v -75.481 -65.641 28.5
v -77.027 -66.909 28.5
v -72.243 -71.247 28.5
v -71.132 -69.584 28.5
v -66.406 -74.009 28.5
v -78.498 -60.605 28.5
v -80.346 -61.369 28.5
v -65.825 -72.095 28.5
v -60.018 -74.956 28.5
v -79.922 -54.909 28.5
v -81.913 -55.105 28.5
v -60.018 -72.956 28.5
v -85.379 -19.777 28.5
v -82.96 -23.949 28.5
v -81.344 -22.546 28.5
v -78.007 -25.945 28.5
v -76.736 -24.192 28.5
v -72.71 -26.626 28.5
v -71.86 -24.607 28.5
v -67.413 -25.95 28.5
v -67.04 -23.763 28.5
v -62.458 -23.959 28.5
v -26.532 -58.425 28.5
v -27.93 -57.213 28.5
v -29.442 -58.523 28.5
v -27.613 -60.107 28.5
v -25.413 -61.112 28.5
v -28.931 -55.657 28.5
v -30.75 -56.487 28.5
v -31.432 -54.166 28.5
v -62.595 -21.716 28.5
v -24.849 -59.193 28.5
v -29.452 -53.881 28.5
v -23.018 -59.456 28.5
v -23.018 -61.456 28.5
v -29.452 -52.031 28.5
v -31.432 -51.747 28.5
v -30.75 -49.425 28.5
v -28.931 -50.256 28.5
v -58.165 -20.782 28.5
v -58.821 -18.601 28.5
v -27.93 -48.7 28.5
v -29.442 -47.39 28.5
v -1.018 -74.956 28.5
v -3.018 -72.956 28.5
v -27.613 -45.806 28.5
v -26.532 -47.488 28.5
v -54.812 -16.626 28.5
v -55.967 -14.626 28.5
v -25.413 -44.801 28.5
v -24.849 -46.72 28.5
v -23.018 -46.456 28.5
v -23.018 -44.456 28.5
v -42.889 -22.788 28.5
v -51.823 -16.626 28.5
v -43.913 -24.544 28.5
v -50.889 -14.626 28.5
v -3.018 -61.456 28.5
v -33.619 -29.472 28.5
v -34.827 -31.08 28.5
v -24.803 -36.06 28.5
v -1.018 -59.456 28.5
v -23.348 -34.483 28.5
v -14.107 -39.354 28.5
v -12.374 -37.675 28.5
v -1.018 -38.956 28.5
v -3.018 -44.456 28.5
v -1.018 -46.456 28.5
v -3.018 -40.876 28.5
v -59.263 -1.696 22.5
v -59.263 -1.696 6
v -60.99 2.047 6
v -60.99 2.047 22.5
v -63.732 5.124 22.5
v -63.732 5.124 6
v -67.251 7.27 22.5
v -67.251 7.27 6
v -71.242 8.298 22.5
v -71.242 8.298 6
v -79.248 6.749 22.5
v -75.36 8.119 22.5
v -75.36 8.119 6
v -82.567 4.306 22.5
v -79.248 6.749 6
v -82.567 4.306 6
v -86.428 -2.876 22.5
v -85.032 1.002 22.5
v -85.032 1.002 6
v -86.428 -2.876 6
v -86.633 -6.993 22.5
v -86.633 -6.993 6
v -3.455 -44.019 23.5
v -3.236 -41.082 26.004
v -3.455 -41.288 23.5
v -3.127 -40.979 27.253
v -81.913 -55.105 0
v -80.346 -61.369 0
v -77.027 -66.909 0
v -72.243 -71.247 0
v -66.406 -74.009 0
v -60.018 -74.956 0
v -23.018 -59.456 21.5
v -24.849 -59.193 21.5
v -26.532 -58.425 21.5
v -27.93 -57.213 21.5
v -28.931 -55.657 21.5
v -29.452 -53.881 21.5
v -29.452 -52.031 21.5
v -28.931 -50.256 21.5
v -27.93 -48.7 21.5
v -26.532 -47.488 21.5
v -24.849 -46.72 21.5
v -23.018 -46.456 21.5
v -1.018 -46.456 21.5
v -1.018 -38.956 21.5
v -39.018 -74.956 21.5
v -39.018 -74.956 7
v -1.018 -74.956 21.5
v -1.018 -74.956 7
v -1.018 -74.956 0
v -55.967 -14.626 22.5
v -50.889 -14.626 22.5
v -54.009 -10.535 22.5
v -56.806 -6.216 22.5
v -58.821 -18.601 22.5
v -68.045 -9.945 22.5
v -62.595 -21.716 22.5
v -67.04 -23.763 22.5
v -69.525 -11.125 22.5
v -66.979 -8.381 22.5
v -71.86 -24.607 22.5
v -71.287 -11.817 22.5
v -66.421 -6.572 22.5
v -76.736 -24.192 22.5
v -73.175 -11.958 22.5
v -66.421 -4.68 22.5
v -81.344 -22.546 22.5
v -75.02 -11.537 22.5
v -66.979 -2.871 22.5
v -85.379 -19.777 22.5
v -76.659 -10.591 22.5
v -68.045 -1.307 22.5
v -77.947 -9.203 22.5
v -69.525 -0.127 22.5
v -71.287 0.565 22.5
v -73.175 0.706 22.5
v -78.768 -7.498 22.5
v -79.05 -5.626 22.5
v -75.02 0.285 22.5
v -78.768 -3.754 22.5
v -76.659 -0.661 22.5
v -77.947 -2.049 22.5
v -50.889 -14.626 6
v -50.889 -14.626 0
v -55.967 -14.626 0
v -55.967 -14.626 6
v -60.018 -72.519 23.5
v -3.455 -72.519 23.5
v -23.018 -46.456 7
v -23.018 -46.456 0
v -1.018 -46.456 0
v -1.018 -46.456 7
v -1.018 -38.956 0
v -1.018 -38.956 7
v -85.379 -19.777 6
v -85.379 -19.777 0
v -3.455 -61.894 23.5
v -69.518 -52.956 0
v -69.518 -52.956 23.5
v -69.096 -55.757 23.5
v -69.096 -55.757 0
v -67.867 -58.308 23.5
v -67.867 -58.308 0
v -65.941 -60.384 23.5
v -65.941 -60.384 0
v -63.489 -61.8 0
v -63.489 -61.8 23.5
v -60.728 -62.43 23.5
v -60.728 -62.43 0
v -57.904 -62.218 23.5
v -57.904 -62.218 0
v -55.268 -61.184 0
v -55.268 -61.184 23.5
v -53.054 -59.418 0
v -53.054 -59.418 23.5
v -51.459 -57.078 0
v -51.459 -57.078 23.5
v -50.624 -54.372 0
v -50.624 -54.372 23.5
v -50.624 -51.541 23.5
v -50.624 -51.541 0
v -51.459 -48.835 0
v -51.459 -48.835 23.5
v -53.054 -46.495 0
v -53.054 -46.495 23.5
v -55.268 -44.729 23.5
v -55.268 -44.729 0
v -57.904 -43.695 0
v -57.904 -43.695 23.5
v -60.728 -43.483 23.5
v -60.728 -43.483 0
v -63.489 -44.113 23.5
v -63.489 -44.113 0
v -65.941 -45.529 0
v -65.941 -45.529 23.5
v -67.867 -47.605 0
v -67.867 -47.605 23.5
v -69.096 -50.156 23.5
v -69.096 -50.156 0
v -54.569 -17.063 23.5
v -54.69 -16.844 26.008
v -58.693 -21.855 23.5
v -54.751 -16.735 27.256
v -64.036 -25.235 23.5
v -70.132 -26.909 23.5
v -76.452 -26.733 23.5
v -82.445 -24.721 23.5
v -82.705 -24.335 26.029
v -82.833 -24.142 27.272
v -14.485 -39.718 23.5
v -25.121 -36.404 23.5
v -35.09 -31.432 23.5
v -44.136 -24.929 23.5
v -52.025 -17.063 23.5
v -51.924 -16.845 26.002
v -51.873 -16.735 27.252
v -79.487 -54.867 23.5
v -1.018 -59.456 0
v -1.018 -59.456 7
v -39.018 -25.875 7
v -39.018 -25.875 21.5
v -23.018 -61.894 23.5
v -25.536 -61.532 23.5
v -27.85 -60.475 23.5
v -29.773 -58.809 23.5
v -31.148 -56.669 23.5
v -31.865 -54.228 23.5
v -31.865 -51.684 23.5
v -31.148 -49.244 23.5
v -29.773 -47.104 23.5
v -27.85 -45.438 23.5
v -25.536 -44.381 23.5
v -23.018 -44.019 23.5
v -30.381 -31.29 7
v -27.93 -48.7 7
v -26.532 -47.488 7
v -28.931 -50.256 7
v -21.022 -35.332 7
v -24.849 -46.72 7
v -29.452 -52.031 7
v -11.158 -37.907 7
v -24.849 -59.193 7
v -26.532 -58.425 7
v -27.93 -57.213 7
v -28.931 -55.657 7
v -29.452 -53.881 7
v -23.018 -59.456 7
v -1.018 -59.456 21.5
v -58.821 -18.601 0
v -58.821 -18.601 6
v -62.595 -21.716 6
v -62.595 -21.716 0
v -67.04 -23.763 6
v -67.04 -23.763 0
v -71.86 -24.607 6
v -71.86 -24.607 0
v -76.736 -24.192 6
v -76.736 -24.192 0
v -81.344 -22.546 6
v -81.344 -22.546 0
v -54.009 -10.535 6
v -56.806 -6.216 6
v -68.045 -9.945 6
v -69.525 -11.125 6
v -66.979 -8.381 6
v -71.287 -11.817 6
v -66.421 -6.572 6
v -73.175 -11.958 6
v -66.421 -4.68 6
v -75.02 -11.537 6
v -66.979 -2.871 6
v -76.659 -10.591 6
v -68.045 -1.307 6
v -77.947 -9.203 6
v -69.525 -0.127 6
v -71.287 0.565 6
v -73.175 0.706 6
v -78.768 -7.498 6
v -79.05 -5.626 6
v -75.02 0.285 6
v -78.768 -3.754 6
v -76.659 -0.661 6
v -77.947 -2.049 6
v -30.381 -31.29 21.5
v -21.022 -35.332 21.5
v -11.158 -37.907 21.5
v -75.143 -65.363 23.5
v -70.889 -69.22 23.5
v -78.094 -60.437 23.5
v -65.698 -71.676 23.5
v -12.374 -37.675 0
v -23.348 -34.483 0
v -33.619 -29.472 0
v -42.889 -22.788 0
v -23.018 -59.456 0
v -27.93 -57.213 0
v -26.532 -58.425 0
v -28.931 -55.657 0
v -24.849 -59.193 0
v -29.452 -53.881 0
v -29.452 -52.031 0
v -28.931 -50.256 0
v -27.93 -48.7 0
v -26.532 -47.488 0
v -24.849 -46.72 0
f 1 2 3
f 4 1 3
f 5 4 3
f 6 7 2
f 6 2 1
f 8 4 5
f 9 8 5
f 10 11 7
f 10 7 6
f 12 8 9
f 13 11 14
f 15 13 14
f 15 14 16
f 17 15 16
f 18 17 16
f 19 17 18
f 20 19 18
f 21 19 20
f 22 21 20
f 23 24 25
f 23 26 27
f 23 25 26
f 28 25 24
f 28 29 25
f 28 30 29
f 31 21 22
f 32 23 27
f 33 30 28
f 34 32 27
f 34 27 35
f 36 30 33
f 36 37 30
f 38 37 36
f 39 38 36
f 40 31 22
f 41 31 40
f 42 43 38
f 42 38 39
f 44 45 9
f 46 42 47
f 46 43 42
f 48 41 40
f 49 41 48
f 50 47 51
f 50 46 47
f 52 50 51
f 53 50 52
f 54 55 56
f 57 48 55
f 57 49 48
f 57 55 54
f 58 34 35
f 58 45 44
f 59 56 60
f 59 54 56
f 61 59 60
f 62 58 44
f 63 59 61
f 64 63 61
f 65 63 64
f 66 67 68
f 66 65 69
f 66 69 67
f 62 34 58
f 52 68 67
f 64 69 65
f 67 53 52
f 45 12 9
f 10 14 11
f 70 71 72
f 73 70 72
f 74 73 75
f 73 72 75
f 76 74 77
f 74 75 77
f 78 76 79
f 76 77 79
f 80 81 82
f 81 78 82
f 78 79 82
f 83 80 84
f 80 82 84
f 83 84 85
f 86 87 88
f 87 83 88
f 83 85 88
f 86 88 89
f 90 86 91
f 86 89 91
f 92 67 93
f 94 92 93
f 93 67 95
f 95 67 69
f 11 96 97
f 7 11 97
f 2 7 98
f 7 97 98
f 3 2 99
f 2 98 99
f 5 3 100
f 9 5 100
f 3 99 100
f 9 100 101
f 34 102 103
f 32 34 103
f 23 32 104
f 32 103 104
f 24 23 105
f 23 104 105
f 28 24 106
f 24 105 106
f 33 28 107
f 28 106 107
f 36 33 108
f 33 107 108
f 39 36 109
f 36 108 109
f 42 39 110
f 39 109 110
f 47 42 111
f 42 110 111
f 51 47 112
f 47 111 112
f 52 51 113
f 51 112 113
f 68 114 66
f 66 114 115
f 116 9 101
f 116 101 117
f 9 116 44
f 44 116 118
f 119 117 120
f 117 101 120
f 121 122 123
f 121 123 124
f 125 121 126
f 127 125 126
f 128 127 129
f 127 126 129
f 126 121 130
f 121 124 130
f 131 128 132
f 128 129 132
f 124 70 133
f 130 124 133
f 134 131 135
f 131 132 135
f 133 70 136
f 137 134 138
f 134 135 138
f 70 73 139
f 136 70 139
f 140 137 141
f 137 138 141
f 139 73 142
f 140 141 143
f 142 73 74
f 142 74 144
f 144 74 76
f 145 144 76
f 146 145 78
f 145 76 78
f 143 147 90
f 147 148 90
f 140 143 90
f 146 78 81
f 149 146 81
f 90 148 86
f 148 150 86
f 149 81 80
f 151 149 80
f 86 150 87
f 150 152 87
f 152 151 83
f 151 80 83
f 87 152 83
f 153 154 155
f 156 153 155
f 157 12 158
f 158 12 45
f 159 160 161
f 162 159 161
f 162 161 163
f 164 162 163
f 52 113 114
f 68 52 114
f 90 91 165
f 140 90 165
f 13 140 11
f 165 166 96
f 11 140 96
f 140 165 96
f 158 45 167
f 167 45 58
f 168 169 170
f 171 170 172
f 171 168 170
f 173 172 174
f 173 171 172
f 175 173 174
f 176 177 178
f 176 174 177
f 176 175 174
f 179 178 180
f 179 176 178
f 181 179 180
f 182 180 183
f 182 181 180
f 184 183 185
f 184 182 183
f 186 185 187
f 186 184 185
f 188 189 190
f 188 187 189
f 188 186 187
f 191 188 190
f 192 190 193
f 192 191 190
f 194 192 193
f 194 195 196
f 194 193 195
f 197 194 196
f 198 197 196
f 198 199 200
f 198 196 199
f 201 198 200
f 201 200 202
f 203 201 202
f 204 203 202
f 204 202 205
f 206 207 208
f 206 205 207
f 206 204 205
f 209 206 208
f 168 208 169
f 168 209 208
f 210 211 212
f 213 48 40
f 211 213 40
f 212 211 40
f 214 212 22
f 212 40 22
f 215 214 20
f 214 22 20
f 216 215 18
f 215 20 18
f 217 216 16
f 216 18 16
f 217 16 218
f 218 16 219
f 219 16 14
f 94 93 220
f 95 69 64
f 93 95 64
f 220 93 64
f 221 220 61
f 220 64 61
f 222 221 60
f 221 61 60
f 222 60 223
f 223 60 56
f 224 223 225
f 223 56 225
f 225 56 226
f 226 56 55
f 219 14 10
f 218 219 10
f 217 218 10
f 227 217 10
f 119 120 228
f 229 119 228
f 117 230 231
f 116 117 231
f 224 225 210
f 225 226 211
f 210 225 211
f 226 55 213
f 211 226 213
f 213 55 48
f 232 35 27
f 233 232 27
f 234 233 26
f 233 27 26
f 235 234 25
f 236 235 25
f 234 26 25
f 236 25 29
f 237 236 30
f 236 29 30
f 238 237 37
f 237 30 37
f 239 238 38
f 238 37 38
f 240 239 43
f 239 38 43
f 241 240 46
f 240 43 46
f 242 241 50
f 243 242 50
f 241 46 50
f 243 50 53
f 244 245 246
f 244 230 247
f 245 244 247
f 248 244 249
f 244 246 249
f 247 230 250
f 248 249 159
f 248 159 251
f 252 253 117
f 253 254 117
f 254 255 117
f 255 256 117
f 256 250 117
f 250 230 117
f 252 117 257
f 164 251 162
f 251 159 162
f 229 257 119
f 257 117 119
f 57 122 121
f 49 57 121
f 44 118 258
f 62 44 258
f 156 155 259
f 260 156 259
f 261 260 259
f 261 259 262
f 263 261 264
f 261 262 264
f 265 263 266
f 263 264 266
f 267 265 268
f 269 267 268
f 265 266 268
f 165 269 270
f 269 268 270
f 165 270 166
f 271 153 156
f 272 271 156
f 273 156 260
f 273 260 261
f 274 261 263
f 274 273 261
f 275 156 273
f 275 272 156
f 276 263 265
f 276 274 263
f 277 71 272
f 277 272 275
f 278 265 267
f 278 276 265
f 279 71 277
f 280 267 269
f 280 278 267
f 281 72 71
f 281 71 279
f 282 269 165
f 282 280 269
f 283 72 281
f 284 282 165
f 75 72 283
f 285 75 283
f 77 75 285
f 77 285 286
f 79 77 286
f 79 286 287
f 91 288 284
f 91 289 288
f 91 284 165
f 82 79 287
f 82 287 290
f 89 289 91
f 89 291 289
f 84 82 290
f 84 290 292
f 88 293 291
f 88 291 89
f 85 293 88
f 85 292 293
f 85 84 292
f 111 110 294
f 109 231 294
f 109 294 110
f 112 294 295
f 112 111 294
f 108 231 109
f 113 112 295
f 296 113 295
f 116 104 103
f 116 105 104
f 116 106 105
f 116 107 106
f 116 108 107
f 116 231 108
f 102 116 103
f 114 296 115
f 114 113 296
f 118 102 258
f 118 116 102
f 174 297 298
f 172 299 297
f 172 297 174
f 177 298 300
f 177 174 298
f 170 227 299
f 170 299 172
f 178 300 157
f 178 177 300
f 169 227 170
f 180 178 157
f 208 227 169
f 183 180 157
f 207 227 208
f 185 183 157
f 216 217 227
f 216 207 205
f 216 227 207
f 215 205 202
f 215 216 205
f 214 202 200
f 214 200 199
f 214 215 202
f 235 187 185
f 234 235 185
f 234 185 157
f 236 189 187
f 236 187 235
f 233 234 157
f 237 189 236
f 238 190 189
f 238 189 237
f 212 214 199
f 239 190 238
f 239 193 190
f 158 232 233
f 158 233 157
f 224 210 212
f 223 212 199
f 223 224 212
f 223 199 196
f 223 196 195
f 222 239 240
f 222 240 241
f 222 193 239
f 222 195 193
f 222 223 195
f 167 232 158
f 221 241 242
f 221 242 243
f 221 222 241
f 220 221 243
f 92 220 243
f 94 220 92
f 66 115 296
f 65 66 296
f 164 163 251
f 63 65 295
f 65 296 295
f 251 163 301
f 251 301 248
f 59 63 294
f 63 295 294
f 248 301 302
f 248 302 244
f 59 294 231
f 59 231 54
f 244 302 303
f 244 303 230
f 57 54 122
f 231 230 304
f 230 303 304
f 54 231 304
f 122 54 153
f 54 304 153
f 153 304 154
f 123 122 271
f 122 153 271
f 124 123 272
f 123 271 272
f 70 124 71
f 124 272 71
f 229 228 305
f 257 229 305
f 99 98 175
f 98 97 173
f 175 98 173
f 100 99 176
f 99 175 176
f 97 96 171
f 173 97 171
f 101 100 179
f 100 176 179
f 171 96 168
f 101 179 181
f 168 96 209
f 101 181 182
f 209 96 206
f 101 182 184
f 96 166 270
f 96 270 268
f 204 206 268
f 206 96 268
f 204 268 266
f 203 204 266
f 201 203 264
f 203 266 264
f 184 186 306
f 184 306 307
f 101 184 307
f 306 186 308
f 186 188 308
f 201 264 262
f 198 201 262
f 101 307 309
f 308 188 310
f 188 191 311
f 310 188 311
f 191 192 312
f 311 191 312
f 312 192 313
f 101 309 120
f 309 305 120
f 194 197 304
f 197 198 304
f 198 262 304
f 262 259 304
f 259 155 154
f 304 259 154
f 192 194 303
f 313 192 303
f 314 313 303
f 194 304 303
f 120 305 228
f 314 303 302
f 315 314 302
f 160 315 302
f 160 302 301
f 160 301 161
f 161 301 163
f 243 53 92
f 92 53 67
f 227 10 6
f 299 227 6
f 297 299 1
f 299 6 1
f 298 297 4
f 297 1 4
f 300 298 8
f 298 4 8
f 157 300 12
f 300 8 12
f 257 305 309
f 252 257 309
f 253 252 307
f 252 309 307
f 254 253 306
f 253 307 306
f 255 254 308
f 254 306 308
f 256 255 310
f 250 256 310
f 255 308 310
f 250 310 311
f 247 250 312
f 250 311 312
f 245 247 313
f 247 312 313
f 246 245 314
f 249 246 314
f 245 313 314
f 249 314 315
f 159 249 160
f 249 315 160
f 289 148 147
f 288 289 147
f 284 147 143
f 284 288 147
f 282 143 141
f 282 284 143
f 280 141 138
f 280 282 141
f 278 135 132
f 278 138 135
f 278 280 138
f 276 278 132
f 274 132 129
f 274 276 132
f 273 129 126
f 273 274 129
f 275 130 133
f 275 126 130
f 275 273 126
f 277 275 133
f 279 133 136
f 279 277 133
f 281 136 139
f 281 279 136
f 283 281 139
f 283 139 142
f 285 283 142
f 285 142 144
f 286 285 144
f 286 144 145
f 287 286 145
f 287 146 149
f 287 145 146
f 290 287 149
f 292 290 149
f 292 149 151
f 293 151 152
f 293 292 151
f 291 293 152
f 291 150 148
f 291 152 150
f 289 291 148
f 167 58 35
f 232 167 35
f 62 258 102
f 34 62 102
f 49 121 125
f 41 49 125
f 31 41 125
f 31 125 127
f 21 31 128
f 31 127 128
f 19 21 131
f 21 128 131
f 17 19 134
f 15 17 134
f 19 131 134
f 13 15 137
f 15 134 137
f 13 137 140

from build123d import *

# Parameters (mm, degrees)
ESQUISSE1_R             = 6.35
ESQUISSE1_R_2           = 9.5
BOSS_EXTRU_1_DEPTH      = 28.5
ENL_V_START             = -6
ENL_V_MAT_EXTRU_1_DEPTH = 6
ENL_V_MAT_EXTRU_2_DEPTH = 6
ESQUISSE4_W             = 38
ESQUISSE4_H             = 14.5
ENL_V_MAT_EXTRU_3_DEPTH = 124.584469767
ENL_V_MAT_EXTRU_5_DEPTH = 5
ENL_V_MAT_EXTRU_5_DRAFT = -5


with BuildPart() as part:
    # Esquisse1 → Boss.-Extru.1 (new body)
    with BuildSketch(Plane.XY):
        with BuildLine():
            Line((-86.633280406, -6.99307262), (-81.912918385, -55.104590809))
            ThreePointArc((-81.912918385, -55.104590809), (-74.795399572, -69.254576275), (-60.018047616, -74.956420883))
            Line((-60.018047616, -74.956420883), (-1.018047616, -74.956420883))
            Line((-1.018047616, -74.956420883), (-1.018047616, -59.456420883))
            Line((-1.018047616, -59.456420883), (-23.018047616, -59.456420883))
            ThreePointArc((-23.018047616, -59.456420883), (-29.518047616, -52.956420883), (-23.018047616, -46.456420883))
            Line((-23.018047616, -46.456420883), (-1.018047616, -46.456420883))
            Line((-1.018047616, -46.456420883), (-1.018047616, -38.956420883))
            ThreePointArc((-1.018047616, -38.956420883), (-35.318453229, -28.420111536), (-59.263146108, -1.695902984))
            ThreePointArc((-59.263146108, -1.695902984), (-75.360354059, 8.118888343), (-86.633280406, -6.99307262))
        make_face()
        with Locations(Location((-72.700180587, -5.626055331, 0), (0, 0, 180))):
            Circle(ESQUISSE1_R, mode=Mode.SUBTRACT)
        with Locations(Location((-60.018047616, -52.956420883, 0), (0, 0, 180))):
            Circle(ESQUISSE1_R_2, mode=Mode.SUBTRACT)
    extrude(amount=BOSS_EXTRU_1_DEPTH)

    # Esquisse2 → Enlèv. mat.-Extru.1 (cut)
    with BuildSketch(Plane.XY.offset(28.5).offset(ENL_V_START)):
        with BuildLine():
            Line((-50.888781824, -14.626055395), (-55.966980296, -14.626055395))
            ThreePointArc((-55.966980296, -14.626055395), (-69.422632675, -24.341227799), (-85.379019392, -19.776922952))
            Line((-85.379019392, -19.776922952), (-86.633280406, -6.99307262))
            ThreePointArc((-86.633280406, -6.99307262), (-75.360354059, 8.118888343), (-59.263146108, -1.695902984))
            ThreePointArc((-59.263146108, -1.695902984), (-55.448825079, -8.402467045), (-50.888781824, -14.626055395))
        make_face()
    extrude(amount=ENL_V_MAT_EXTRU_1_DEPTH, mode=Mode.SUBTRACT)

    # Esquisse3 → Enlèv. mat.-Extru.2 (cut)
    with BuildSketch(Plane(origin=(0, 0, 0), x_dir=(-1, 0, 0), z_dir=(0, 0, -1))):
        with BuildLine():
            Line((85.379019392, -19.776922952), (86.633280406, -6.99307262))
            ThreePointArc((86.633280406, -6.99307262), (75.360354059, 8.118888343), (59.263146108, -1.695902984))
            ThreePointArc((59.263146108, -1.695902984), (55.448825079, -8.402467045), (50.888781824, -14.626055395))
            Line((50.888781824, -14.626055395), (55.966980296, -14.626055395))
            ThreePointArc((55.966980296, -14.626055395), (69.422632675, -24.341227799), (85.379019392, -19.776922952))
        make_face()
    extrude(amount=-ENL_V_MAT_EXTRU_2_DEPTH, mode=Mode.SUBTRACT)

    # Esquisse4 → Enlèv. mat.-Extru.3 (cut, through all)
    with BuildSketch(Plane.XZ.offset(74.956420883)):
        with Locations((-20.018047616, 14.25)):
            Rectangle(ESQUISSE4_W, ESQUISSE4_H)
    extrude(amount=-ENL_V_MAT_EXTRU_3_DEPTH, mode=Mode.SUBTRACT)


with BuildPart() as enl_v_mat_extru_5_tool:
    # Esquisse5 → Enlèv. mat.-Extru.5 (with draft: the straight prism first)
    with BuildSketch(Plane.XY.offset(28.5)):
        with BuildLine():
            Line((-51.822935649, -16.626055395), (-54.811637006, -16.626055395))
            ThreePointArc((-54.811637006, -16.626055395), (-67.412845938, -25.949541557), (-82.960069876, -23.949119459))
            Line((-82.960069876, -23.949119459), (-79.922475588, -54.909302634))
            ThreePointArc((-79.922475588, -54.909302634), (-73.452003939, -67.772925785), (-60.018047616, -72.956420883))
            Line((-60.018047616, -72.956420883), (-3.018047616, -72.956420883))
            Line((-3.018047616, -72.956420883), (-3.018047616, -61.456420883))
            Line((-3.018047616, -61.456420883), (-23.018047616, -61.456420883))
            ThreePointArc((-23.018047616, -61.456420883), (-31.518047616, -52.956420883), (-23.018047616, -44.456420883))
            Line((-23.018047616, -44.456420883), (-3.018047616, -44.456420883))
            Line((-3.018047616, -44.456420883), (-3.018047616, -40.875747076))
            ThreePointArc((-3.018047616, -40.875747076), (-29.916011773, -33.773380805), (-51.822935649, -16.626055395))
        make_face()
    extrude(amount=-ENL_V_MAT_EXTRU_5_DEPTH)
    # Enlèv. mat.-Extru.5: the draft: its side faces are tilted about the plane it starts from
    enl_v_mat_extru_5_sides = [enl_v_mat_extru_5_tool.faces().sort_by_distance(p)[0] for p in [
        (-53.317286327, -16.626055395, 26),
        (-67.412845938, -25.949541557, 26),
        (-81.441272732, -39.429211046, 26),
        (-73.452003939, -67.772925785, 26),
        (-31.518047616, -72.956420883, 26),
        (-3.018047616, -67.206420883, 26),
        (-13.018047616, -61.456420883, 26),
        (-31.518047616, -52.956420883, 26),
        (-13.018047616, -44.456420883, 26),
        (-3.018047616, -42.66608398, 26),
        (-29.916011773, -33.773380805, 26),
    ]]
    draft(enl_v_mat_extru_5_sides, Plane.XY.offset(28.5), ENL_V_MAT_EXTRU_5_DRAFT)


with BuildPart() as part_1:
    add(part.part)

    # Enlèv. mat.-Extru.5: cut by enl_v_mat_extru_5_tool
    add(enl_v_mat_extru_5_tool.part, mode=Mode.SUBTRACT)


solid = part_1.part
